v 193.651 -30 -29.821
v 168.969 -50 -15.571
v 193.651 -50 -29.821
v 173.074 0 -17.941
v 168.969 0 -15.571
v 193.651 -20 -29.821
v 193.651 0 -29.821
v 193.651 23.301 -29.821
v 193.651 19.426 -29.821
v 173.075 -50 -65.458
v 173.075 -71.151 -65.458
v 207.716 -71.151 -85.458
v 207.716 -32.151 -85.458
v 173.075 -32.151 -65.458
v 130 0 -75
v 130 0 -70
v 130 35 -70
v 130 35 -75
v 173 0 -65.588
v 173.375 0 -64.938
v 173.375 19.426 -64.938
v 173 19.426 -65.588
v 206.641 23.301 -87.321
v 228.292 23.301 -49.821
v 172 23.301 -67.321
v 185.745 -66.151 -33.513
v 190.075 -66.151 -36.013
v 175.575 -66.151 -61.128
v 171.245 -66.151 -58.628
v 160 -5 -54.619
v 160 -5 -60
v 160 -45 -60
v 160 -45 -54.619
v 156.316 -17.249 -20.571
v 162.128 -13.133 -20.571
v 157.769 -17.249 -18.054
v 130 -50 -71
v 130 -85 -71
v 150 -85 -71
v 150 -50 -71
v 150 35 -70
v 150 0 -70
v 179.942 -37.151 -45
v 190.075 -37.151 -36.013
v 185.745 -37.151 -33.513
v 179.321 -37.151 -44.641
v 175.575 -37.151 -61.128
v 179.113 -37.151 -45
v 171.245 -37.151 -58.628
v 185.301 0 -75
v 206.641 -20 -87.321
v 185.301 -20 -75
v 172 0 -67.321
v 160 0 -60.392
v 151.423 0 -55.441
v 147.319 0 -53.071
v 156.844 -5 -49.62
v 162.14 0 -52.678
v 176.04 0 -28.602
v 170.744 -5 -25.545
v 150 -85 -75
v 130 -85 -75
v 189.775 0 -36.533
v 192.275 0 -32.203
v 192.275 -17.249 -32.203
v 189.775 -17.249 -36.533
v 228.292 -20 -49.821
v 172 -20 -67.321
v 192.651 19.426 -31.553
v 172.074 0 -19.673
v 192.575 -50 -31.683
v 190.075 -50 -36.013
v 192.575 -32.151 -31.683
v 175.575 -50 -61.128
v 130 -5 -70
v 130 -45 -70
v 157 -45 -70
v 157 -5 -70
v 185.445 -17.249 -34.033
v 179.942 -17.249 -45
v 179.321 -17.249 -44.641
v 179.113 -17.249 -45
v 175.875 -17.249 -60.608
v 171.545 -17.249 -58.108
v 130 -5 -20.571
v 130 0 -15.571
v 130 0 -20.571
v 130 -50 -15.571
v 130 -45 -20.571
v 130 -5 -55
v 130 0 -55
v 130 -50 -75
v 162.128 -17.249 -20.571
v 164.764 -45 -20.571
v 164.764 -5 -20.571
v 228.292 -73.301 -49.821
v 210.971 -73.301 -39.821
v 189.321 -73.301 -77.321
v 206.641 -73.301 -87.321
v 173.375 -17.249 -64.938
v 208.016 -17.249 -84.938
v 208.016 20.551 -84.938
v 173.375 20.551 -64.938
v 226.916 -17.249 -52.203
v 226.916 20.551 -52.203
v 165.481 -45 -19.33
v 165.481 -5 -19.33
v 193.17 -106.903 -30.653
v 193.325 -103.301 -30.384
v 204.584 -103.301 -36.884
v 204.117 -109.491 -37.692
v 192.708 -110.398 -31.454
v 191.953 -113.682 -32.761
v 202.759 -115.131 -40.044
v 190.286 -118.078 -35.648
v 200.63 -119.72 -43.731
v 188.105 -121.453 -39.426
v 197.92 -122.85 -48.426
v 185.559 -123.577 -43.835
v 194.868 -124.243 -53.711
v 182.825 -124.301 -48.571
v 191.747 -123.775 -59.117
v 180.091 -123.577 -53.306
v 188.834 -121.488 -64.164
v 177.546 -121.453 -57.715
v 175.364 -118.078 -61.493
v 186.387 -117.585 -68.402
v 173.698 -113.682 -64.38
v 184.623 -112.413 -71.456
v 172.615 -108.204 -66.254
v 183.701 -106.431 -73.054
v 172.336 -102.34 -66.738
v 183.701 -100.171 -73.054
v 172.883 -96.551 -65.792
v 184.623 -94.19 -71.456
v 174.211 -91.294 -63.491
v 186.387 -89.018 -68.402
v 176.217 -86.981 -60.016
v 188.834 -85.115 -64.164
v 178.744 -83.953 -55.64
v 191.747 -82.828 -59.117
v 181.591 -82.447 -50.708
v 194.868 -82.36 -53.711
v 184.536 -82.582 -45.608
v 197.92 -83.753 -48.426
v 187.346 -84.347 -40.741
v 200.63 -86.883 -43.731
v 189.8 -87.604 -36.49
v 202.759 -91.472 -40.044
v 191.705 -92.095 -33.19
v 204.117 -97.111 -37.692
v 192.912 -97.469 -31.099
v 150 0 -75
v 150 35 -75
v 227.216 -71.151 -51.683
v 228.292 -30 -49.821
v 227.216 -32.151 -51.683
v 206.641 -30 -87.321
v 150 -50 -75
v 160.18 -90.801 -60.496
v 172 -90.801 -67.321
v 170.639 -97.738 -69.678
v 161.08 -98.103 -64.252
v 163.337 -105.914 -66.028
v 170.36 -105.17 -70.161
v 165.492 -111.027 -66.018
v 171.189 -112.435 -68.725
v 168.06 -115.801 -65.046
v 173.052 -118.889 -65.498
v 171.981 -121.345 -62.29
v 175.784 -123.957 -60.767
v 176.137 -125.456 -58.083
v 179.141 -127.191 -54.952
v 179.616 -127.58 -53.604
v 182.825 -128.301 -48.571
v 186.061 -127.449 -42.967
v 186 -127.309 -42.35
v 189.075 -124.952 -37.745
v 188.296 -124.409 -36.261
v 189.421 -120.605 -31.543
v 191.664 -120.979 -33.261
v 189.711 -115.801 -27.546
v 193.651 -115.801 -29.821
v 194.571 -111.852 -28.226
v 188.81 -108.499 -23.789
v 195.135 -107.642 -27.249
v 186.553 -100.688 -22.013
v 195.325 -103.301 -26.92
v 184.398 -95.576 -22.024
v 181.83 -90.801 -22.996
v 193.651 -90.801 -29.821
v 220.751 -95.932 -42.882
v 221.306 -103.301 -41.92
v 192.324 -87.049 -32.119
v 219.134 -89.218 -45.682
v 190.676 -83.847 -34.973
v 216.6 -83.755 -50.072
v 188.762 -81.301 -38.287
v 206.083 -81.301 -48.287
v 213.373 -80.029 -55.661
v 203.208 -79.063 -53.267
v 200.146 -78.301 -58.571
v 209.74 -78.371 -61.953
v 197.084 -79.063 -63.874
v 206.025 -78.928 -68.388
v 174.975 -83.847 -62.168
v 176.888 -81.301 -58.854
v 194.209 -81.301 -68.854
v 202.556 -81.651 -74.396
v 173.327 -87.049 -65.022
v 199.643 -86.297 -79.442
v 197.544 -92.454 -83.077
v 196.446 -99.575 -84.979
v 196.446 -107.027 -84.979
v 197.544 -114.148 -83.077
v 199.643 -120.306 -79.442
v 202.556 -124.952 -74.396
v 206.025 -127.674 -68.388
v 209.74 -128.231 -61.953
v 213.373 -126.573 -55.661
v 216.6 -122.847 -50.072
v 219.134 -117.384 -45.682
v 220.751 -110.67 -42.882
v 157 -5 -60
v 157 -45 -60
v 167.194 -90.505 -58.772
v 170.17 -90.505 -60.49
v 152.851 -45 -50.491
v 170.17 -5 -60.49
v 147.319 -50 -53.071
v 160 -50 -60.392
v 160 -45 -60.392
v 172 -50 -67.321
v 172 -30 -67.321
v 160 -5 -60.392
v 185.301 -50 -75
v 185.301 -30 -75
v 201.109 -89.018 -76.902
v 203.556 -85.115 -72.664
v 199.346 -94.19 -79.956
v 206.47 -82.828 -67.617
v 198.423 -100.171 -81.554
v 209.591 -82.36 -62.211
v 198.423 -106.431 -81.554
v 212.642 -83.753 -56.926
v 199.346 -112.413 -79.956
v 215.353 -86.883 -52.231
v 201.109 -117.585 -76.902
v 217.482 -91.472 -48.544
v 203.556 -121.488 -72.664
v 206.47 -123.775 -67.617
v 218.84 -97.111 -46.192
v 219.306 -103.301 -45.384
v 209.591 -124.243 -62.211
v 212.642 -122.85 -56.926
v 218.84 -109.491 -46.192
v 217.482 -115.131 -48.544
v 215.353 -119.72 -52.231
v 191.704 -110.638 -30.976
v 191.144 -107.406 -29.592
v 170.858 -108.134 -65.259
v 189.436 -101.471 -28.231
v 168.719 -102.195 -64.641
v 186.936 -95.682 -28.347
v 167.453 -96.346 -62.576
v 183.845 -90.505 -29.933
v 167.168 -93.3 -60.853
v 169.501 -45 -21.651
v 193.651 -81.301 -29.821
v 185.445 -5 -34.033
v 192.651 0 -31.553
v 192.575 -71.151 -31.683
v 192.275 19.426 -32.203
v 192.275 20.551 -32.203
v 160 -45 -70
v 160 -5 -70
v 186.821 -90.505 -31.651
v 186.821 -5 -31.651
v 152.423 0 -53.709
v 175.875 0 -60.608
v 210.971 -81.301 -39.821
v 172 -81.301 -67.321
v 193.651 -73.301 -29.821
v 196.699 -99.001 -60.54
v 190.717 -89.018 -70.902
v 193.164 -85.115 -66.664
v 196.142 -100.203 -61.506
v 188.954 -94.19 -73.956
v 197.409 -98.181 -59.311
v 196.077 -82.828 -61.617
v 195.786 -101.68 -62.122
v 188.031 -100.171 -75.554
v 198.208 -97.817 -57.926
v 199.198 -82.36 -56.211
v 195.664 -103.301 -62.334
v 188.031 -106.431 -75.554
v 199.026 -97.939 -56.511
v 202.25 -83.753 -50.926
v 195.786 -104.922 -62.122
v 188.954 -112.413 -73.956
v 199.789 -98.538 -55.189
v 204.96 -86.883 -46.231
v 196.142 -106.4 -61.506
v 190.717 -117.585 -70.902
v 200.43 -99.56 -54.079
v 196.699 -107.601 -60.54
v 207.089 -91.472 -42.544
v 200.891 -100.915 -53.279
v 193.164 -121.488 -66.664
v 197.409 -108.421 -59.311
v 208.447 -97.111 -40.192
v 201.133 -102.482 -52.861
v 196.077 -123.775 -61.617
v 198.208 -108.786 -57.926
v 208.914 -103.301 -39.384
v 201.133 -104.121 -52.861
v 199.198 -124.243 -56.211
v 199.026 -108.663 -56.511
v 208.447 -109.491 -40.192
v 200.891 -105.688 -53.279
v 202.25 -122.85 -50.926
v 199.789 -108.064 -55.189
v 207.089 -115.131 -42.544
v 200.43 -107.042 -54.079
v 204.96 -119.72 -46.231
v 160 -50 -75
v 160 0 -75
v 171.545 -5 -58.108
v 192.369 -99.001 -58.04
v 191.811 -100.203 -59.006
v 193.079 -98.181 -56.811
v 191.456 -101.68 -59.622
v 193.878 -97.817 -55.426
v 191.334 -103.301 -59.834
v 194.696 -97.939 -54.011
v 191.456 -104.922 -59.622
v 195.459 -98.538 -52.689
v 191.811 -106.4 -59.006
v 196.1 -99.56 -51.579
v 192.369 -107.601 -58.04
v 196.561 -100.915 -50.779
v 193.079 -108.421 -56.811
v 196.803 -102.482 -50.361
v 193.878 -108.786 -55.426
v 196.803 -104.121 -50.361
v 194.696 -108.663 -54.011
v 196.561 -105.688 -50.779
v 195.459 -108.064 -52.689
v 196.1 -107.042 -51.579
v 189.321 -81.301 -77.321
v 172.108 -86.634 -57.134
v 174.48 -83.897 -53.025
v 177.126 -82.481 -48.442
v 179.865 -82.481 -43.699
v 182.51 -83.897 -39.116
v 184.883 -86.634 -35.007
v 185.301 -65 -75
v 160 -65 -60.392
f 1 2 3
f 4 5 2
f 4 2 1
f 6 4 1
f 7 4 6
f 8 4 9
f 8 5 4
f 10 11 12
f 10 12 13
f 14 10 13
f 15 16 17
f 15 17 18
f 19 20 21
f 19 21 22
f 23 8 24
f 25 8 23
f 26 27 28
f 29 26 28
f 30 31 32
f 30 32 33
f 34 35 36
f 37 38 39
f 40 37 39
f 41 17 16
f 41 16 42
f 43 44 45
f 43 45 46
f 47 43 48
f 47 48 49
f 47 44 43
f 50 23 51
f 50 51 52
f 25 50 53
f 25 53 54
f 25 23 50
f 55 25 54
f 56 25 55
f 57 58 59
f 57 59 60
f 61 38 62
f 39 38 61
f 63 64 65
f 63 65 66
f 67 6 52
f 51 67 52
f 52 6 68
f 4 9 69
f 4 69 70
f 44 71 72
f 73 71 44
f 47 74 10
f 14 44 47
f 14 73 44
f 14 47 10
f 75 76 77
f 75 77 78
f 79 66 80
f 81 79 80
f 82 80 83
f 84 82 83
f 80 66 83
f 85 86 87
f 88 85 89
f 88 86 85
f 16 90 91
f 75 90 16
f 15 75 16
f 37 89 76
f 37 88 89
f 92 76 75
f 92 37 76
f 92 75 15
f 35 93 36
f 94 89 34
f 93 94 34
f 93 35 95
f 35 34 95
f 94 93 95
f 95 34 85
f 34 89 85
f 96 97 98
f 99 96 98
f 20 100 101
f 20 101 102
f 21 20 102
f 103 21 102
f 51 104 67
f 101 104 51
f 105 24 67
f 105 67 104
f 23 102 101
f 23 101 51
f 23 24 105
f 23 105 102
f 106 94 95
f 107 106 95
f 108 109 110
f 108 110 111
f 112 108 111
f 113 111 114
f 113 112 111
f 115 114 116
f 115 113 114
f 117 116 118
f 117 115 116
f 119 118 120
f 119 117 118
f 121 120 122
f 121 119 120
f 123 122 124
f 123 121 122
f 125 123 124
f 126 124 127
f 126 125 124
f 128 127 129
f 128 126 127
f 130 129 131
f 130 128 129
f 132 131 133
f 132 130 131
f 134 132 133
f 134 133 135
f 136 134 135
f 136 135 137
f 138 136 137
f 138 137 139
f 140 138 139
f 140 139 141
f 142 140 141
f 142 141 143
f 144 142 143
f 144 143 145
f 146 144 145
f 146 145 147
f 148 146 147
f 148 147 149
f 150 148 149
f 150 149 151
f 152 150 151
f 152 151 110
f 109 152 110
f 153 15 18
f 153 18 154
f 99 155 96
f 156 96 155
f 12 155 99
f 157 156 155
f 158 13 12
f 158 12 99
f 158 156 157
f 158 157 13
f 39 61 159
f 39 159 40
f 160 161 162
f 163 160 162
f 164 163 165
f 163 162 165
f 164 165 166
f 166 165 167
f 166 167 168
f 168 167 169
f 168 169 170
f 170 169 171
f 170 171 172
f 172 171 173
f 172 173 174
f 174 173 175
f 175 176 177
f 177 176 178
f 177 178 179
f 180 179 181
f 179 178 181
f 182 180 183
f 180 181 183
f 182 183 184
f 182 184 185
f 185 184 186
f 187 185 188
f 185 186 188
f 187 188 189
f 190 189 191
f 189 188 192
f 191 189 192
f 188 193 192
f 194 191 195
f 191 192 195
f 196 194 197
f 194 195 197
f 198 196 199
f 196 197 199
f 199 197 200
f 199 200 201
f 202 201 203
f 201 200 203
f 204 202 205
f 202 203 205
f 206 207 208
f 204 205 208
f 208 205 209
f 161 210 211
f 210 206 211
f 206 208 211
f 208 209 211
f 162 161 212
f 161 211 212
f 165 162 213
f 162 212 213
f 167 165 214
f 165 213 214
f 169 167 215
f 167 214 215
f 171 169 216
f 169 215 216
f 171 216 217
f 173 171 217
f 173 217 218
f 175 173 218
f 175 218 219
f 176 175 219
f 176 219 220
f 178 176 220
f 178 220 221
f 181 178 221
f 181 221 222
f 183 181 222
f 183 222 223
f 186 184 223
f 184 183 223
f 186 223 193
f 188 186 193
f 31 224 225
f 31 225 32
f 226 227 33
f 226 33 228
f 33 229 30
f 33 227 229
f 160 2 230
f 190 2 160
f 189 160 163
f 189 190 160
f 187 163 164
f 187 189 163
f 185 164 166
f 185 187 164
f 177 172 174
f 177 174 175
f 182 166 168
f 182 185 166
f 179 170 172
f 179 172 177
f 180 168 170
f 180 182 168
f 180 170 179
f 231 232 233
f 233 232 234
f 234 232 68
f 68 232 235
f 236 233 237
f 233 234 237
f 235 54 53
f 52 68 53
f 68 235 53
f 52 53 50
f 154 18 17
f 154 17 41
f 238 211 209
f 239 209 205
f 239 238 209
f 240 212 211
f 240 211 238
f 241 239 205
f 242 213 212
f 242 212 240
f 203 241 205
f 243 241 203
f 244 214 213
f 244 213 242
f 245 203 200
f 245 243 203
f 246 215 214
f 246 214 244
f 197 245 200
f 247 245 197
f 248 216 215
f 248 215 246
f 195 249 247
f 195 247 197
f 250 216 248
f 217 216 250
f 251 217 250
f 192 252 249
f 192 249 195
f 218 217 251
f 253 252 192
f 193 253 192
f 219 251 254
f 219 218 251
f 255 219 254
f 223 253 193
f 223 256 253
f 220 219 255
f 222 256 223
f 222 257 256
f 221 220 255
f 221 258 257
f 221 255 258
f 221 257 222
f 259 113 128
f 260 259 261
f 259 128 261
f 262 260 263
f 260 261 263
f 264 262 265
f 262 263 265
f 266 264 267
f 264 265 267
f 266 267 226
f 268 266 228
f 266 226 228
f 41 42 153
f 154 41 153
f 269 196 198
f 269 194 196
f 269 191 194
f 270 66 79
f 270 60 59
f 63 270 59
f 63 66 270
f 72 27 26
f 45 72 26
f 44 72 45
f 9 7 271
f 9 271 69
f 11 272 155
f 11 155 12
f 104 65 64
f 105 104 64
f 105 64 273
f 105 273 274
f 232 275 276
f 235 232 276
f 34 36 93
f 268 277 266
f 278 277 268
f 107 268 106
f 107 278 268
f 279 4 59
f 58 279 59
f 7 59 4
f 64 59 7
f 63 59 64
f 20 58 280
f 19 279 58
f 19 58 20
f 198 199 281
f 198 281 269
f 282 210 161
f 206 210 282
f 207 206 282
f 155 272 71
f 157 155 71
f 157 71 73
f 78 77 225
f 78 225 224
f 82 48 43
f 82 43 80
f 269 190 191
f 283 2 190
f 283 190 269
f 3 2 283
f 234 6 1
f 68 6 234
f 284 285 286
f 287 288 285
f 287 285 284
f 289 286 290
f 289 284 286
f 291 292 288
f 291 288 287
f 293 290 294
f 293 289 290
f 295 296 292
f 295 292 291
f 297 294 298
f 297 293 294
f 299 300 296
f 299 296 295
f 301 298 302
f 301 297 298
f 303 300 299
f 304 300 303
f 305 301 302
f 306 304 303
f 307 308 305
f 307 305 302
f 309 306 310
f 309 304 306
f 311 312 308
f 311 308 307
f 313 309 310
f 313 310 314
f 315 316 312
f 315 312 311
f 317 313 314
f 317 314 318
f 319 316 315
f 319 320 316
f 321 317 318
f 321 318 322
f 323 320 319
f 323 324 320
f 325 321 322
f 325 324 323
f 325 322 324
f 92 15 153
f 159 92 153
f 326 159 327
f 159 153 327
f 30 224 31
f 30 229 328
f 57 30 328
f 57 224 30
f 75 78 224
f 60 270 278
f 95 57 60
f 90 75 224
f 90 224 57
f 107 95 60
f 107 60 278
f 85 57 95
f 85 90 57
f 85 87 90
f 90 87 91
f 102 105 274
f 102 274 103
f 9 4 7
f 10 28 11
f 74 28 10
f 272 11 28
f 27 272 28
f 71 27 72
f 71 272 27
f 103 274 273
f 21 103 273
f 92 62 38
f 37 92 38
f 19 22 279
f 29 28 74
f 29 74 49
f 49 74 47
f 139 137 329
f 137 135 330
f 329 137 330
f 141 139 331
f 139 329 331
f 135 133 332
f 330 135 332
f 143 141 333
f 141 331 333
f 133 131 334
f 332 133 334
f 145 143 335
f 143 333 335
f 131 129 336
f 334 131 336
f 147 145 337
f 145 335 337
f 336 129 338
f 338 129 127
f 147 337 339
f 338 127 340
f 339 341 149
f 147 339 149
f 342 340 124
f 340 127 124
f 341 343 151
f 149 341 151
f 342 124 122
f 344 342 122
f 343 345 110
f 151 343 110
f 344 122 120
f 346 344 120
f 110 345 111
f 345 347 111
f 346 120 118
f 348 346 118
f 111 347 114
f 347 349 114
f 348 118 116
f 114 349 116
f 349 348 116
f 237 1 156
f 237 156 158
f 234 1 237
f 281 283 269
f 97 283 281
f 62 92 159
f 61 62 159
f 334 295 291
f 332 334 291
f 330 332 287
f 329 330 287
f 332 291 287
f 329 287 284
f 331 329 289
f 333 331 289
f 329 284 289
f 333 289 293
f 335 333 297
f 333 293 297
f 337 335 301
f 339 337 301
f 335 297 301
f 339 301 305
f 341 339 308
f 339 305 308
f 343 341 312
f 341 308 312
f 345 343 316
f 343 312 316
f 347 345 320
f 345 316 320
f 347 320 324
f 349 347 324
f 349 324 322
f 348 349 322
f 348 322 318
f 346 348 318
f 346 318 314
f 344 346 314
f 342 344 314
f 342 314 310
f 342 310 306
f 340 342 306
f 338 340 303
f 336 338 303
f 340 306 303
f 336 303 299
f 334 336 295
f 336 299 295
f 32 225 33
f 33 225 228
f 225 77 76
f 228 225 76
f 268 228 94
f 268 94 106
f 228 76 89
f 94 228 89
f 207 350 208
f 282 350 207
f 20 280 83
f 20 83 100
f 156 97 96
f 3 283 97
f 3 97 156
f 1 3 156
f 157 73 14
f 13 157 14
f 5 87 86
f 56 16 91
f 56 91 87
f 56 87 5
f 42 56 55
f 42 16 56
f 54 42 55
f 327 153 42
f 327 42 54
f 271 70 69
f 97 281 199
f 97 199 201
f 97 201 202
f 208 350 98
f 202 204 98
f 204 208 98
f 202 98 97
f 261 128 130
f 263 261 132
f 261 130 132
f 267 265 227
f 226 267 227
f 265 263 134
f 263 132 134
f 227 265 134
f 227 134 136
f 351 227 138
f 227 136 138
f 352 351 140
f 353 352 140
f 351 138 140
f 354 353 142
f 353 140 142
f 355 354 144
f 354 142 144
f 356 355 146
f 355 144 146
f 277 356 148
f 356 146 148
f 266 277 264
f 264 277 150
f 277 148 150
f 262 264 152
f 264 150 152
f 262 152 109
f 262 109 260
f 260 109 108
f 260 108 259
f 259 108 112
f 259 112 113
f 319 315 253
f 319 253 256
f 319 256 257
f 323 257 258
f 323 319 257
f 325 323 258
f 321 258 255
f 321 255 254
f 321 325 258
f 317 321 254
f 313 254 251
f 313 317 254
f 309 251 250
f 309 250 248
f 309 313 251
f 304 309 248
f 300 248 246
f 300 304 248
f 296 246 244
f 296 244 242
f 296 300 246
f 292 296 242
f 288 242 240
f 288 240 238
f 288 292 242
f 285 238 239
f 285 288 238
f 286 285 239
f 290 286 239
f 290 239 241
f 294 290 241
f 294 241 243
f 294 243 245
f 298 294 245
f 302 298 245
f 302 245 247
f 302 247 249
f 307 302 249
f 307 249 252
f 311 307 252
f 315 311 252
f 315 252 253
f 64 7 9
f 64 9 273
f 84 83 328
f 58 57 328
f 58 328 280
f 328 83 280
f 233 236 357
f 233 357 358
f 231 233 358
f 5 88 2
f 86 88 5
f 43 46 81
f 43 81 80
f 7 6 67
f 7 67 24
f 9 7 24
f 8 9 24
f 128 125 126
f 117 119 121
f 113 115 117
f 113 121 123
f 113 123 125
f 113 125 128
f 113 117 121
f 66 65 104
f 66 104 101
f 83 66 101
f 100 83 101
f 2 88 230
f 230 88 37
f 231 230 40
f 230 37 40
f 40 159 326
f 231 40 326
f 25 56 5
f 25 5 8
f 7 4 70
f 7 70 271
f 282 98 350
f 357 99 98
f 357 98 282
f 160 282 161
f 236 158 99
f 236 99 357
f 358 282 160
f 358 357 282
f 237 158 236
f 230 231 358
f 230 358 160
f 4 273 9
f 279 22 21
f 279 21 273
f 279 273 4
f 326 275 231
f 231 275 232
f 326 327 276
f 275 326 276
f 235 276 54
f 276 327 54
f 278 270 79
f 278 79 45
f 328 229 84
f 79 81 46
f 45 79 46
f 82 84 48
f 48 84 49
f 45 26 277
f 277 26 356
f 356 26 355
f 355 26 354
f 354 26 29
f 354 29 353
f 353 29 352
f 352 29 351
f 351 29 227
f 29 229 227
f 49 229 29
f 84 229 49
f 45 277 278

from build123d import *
from build123d.topology import SkipClean

# Parameters (mm, degrees)
SKETCH_1_W                         = 142
SKETCH_1_H                         = 50
EXTRUDE_1_DEPTH                    = 50
EXTRUDE_2_DEPTH                    = 50
SKETCH_3_W                         = 43.301270189
SKETCH_3_H                         = 43.301270189
SKETCH_3_W_2                       = 39
SKETCH_3_H_2                       = 39
EXTRUDE_1229_DEPTH                 = 40
SKETCH_4_W                         = 43.301270189
SKETCH_4_H                         = 43.301270189
SKETCH_4_W_2                       = 37.8
SKETCH_4_H_2                       = 37.8
EXTRUDE_1555_DEPTH                 = 40
SKETCH_6_R                         = 25
SKETCH_6_R_2                       = 21
EXTRUDE_5_DEPTH                    = 30
EXTRUDE_START                      = -12
SKETCH_8_R                         = 21
SKETCH_8_R_2                       = 5.5
EXTRUDE_6_DEPTH                    = 5
EXTRUDE_START_2                    = -43.30127
EXTRUDE_7_DEPTH                    = 43.30127
EXTRUDE_10_REACH                   = 275.562
SKETCH_10_W                        = 20
SKETCH_10_H                        = 8
EXTRUDE_11_REACH                   = 275.562
EXTRUDE_12_DEPTH                   = 2
EXTRUDE_13_DEPTH                   = 2
CUT_EXTRUDE_1_DEPTH                = 249.328501215
EXTRUDE_14_REACH                   = 225.182
CUT_EXTRUDE_2_REACH                = 278.049
SKETCH_17_W                        = 40
SKETCH_17_H                        = 40
CUT_EXTRUDE_START                  = -5
CUT_EXTRUDE_3_DEPTH                = 33.301270189
CUT_EXTRUDE_4_REACH                = 230.182
CUT_EXTRUDE_4_OFFSET_FROM_SURFACE  = 5
SKETCH_20_W                        = 27.8
SKETCH_20_H                        = 30
CUT_EXTRUDE_5_REACH                = 230.182
CUT_EXTRUDE_5_OFFSET_FROM_SURFACE  = 5
SKETCH_22_W                        = 29
SKETCH_22_H                        = 29
CUT_EXTRUDE_START_2                = -19.776530706
CUT_EXTRUDE_6_OUTLINE_R            = 5.5
CUT_EXTRUDE_6_DEPTH                = 1.776530706
CUT_EXTRUDE_START_3                = 177.616623489
CUT_EXTRUDE_6_2_OUTLINE_R          = 5.5
CUT_EXTRUDE_6_2_DEPTH              = 3.223469294
CUT_EXTRUDE_START_4                = 129
CUT_EXTRUDE_6_3_OUTLINE_W          = 14
CUT_EXTRUDE_6_3_OUTLINE_H          = 14
CUT_EXTRUDE_6_3_DEPTH              = 3.721874706
CUT_EXTRUDE_7_REACH                = 225.182
SKETCH_24_R                        = 21
EXTRUDE_START_3                    = -50
SKETCH_28_W                        = 40
SKETCH_28_H                        = 60
EXTRUDE_15_DEPTH                   = 25
SKETCH_28_H_2                      = 35
EXTRUDE_15_2_DEPTH                 = 25
EXTRUDE_16_REACH                   = 278.049
SKETCH_29_W                        = 25
SKETCH_29_H                        = 50
SKETCH_30_W                        = 25
SKETCH_30_H                        = 40
CUT_EXTRUDE_8_DEPTH                = 160
SKETCH_31_W                        = 15.570842249
SKETCH_31_H                        = 50
CUT_EXTRUDE_9_DEPTH                = 277.049207735
EXTRUDE_17_REACH                   = 278.049
SKETCH_32_W                        = 5
SKETCH_32_H                        = 40
SKETCH_33_W                        = 40
SKETCH_33_H                        = 30
CUT_EXTRUDE_10_DEPTH               = 5
SKETCH_34_W                        = 40
SKETCH_34_H                        = 34.429157751
CUT_EXTRUDE_12_DEPTH               = 5
CUT_EXTRUDE_15_REACH               = 280.632
CUT_EXTRUDE_15_OFFSET_FROM_SURFACE = 5
SKETCH_37_W                        = 15.381197846
SKETCH_37_H                        = 25
EXTRUDE_18_DEPTH                   = 20
CHAMFER_1_SIZE                     = 1
CUT_EXTRUDE_16_DEPTH               = 277.049207735
CUT_EXTRUDE_16_DEPTH_BACK          = 277.049207735
SKETCH_38_W                        = 168.693453403
SKETCH_38_H                        = 59.429157751
SKETCH_39_W                        = 20
SKETCH_39_H                        = 5
EXTRUDE_19_DEPTH                   = 35
SKETCH_40_W                        = 20
SKETCH_40_H                        = 4
EXTRUDE_20_DEPTH                   = 35
CUT_EXTRUDE_17_DEPTH               = 65
SKETCH_42_W                        = 3
SKETCH_42_H                        = 40
EXTRUDE_21_DEPTH                   = 10


with BuildPart() as part:
    # 草图1 → 凸台-拉伸1 (new body)
    with BuildSketch(Plane.XY):
        with Locations((71, -25)):
            Rectangle(SKETCH_1_W, SKETCH_1_H)
    extrude(amount=-EXTRUDE_1_DEPTH)

    # 草图2 → 凸台-拉伸2 (add)
    with BuildSketch(Plane(origin=(0, 0, 0), x_dir=(1, 0, 0), z_dir=(0, 1, 0))):
        Polygon((172, 67.320508076), (142, 50), (142, 0), (193.650635095, 29.820508076), align=None)
    extrude(amount=-EXTRUDE_2_DEPTH)

    # 草图3 → Extrude 1229 (add)
    with BuildSketch(Plane(origin=(158.150635095, 0, -91.308311744), x_dir=(-0.5000000000000012, 0, -0.866025403784438), z_dir=(0.8660254037844379, 0, -0.5000000000000011))):
        with Locations((-49.349364906, -51.650635095)):
            Rectangle(SKETCH_3_W, SKETCH_3_H)
        with Locations((-49.349364905, -51.650635095)):
            Rectangle(SKETCH_3_W_2, SKETCH_3_H_2, mode=Mode.SUBTRACT)
    extrude(amount=EXTRUDE_1229_DEPTH)

    # 草图4 → Extrude 1555 (add)
    with BuildSketch(Plane(origin=(158.150635095, 0, -91.308311744), x_dir=(-0.5000000000000012, 0, -0.866025403784438), z_dir=(0.8660254037844379, 0, -0.5000000000000011))):
        with Locations((-49.349364906, 1.650635095)):
            Rectangle(SKETCH_4_W, SKETCH_4_H)
        with Locations((-49.349364905, 1.650635095)):
            Rectangle(SKETCH_4_W_2, SKETCH_4_H_2, mode=Mode.SUBTRACT)
    extrude(amount=EXTRUDE_1555_DEPTH)



with BuildPart() as body_2:
    # 草图6 → 凸台-拉伸5 (new body)
    with BuildSketch(Plane(origin=(158.150635095, 0, -91.308311744), x_dir=(-0.5000000000000012, 0, -0.866025403784438), z_dir=(0.8660254037844379, 0, -0.5000000000000011))):
        with Locations(Location((-49.349364905, -103.301270189, 0), (0, 0, 180))):
            Circle(SKETCH_6_R)
        with Locations(Location((-49.349364905, -103.301270189, 0), (0, 0, 180))):
            Circle(SKETCH_6_R_2, mode=Mode.SUBTRACT)
    extrude(amount=EXTRUDE_5_DEPTH)

    # 草图8 → 凸台-拉伸6 (add)
    with BuildSketch(Plane(origin=(184.131397208, 0, -106.308311744), x_dir=(-0.5000000000000014, 0, -0.8660254037844379), z_dir=(0.8660254037844378, 0, -0.5000000000000013)).offset(EXTRUDE_START)):
        with Locations(Location((-49.349364905, -103.301270189, 0), (0, 0, 180))):
            Circle(SKETCH_8_R)
        with Locations((-49.349364905, -103.301270189)):
            Circle(SKETCH_8_R_2, mode=Mode.SUBTRACT)
    extrude(amount=-EXTRUDE_6_DEPTH)


with BuildPart() as part_1:
    with SkipClean():  # the faces are left unmerged after this step: merging them gives an invalid solid
        add(part.part)

        add(body_2.part)  # 凸台-拉伸7 merges body 2
        # 草图9 → 凸台-拉伸7 (add)
        with BuildSketch(Plane(origin=(13.849364905, 0, 23.987803669), x_dir=(-0.866025403784438, 0, 0.5000000000000012), z_dir=(-0.5000000000000012, 0, -0.866025403784438)).offset(EXTRUDE_START_2)):
            Polygon((-154.117291835, -50), (-182.616623489, -128.301270189), (-182.616623489, -50), align=None)
        extrude(amount=EXTRUDE_7_DEPTH)

    # 凸台-拉伸10: up to this face of the body (flat: up to its plane)
    extrude_10_end = Plane(part_1.part.faces().sort_by_distance((191.011477977, -25, -28.296790003))[0])
    # 草图10 → 凸台-拉伸10 (add, up to the picked face)
    with BuildSketch(Plane(origin=(13.849364905, 0, 23.987803669), x_dir=(-0.866025403784438, 0, 0.5000000000000012), z_dir=(-0.5000000000000012, 0, -0.866025403784438)), mode=Mode.PRIVATE) as extrude_10_sk1:
        with Locations((-192.616623489, -77.301270189)):
            Rectangle(SKETCH_10_W, SKETCH_10_H)
    extrude_10_tool1 = split(extrude(extrude_10_sk1.sketch, amount=-EXTRUDE_10_REACH, mode=Mode.PRIVATE), bisect_by=extrude_10_end, keep=Keep.BOTH, mode=Mode.PRIVATE)
    add(extrude_10_tool1.solids().sort_by(Axis((180.660254, -77.30127, -72.320508), (0.5000000000000012, 0, 0.866025403784438)))[0])

    # 凸台-拉伸11: up to this face of the body (flat: up to its plane)
    extrude_11_end = Plane(part_1.part.faces().sort_by_distance((191.011477977, -25, -28.296790003))[0])
    # 草图11 → 凸台-拉伸11 (add, up to the picked face)
    with BuildSketch(Plane(origin=(13.849364905, 0, 23.987803669), x_dir=(-0.866025403784438, 0, 0.5000000000000012), z_dir=(-0.5000000000000012, 0, -0.866025403784438)), mode=Mode.PRIVATE) as extrude_11_sk1:
        Polygon((-154.117291835, 0), (-182.616623489, 23.301270189), (-182.616623489, 19.42617797), (-158.856841973, 0), align=None)
    extrude_11_tool1 = split(extrude(extrude_11_sk1.sketch, amount=-EXTRUDE_11_REACH, mode=Mode.PRIVATE), bisect_by=extrude_11_end, keep=Keep.BOTH, mode=Mode.PRIVATE)
    add(extrude_11_tool1.solids().sort_by(Axis((160.654549, 10.711149, -60.770209), (0.5000000000000012, 0, 0.866025403784438)))[0])

    # 草图12 → 凸台-拉伸12 (add)
    with SkipClean():  # the faces are left unmerged after this step: merging them gives an invalid solid
        with BuildSketch(Plane(origin=(13.849364905, 0, 23.987803669), x_dir=(-0.866025403784438, 0, 0.5000000000000012), z_dir=(-0.5000000000000012, 0, -0.866025403784438))):
            Polygon((-182.616623489, 19.42617797), (-182.616623489, 0), (-158.856841973, 0), align=None)
        extrude(amount=-EXTRUDE_12_DEPTH)

    # 草图15 → 切除-拉伸1 (cut, through all)
    with SkipClean():  # the faces are left unmerged after this step: merging them gives an invalid solid
        with BuildSketch(Plane(origin=(184.131397208, 0, -106.308311744), x_dir=(-0.5000000000000014, 0, -0.8660254037844379), z_dir=(0.8660254037844378, 0, -0.5000000000000013))):
            with BuildLine():
                Line((-49.349364905, -128.301270189), (-27.698729811, -128.301270189))
                Line((-27.698729811, -128.301270189), (-27.698729811, -115.801270189))
                ThreePointArc((-27.698729811, -115.801270189), (-36.849364905, -124.951905284), (-49.349364905, -128.301270189))
            make_face()
            with BuildLine():
                Line((-71, -128.301270189), (-49.349364905, -128.301270189))
                ThreePointArc((-49.349364905, -128.301270189), (-61.849364905, -124.951905284), (-71, -115.801270189))
                Line((-71, -115.801270189), (-71, -128.301270189))
            make_face()
        extrude(amount=-CUT_EXTRUDE_1_DEPTH, mode=Mode.SUBTRACT)

    # 凸台-拉伸14: up to this plane
    with SkipClean():  # the faces are left unmerged after this step: merging them gives an invalid solid
        extrude_14_end = Plane(origin=(210.632725537, -50, 56.591998698), z_dir=(-0.8137976813493748, -0.3420201433256631, 0.46984631039295627))
        # 草图16 → 凸台-拉伸14 (add, up to the surface)
        with BuildSketch(Plane(origin=(158.150635095, 0, -91.308311744), x_dir=(0.5000000000000014, 0, 0.8660254037844379), z_dir=(-0.8660254037844378, 0, 0.5000000000000013)), mode=Mode.PRIVATE) as extrude_14_sk1:
            with BuildLine():
                Line((27.698729811, -115.801270189), (27.698729811, -90.801270189))
                ThreePointArc((27.698729811, -90.801270189), (24.349364905, -103.301270189), (27.698729811, -115.801270189))
            make_face()
        extrude_14_tool1 = split(extrude(extrude_14_sk1.sketch, amount=EXTRUDE_14_REACH, mode=Mode.PRIVATE), bisect_by=extrude_14_end, keep=Keep.BOTH, mode=Mode.PRIVATE)
        add(extrude_14_tool1.solids().sort_by_distance((171.326125, -103.30127, -68.487693))[0])
        # 草图16 → 凸台-拉伸14 (add, up to the surface)
        with BuildSketch(Plane(origin=(158.150635095, 0, -91.308311744), x_dir=(0.5000000000000014, 0, 0.8660254037844379), z_dir=(-0.8660254037844378, 0, 0.5000000000000013)), mode=Mode.PRIVATE) as extrude_14_sk2:
            with BuildLine():
                Line((71, -90.801270189), (71, -115.801270189))
                ThreePointArc((71, -115.801270189), (74.349364905, -103.301270189), (71, -90.801270189))
            make_face()
        extrude_14_tool2 = split(extrude(extrude_14_sk2.sketch, amount=EXTRUDE_14_REACH, mode=Mode.PRIVATE), bisect_by=extrude_14_end, keep=Keep.BOTH, mode=Mode.PRIVATE)
        add(extrude_14_tool2.solids().sort_by_distance((194.32451, -103.30127, -28.653323))[0])
    add(part_1.part.scale(1), mode=Mode.REPLACE)  # the faces are merged on a copy

    # 切除-拉伸2: up to this plane
    cut_extrude_2_end = Plane(origin=(25.5, -134.851864524, 44.167295593), z_dir=(0.5000000000000016, 0, 0.8660254037844378))
    # 草图17 → 切除-拉伸2 (cut, up to the surface)
    with BuildSketch(Plane.ZY, mode=Mode.PRIVATE) as cut_extrude_2_sk1:
        with Locations((-25, -25)):
            Rectangle(SKETCH_17_W, SKETCH_17_H)
    cut_extrude_2_tool1 = split(extrude(cut_extrude_2_sk1.sketch, amount=-CUT_EXTRUDE_2_REACH, mode=Mode.PRIVATE), bisect_by=cut_extrude_2_end, keep=Keep.BOTH, mode=Mode.PRIVATE)
    add(cut_extrude_2_tool1.solids().sort_by_distance((0, -25, -25))[0], mode=Mode.SUBTRACT)

    # 草图19 → 切除-拉伸3 (cut)
    with BuildSketch(Plane(origin=(13.849364905, 0, 23.987803669), x_dir=(-0.866025403784438, 0, 0.5000000000000012), z_dir=(-0.5000000000000012, 0, -0.866025403784438)).offset(CUT_EXTRUDE_START)):
        Polygon((-177.616623489, -5), (-177.616623489, -99.944861091), (-157.618329526, -45), (-152.975607337, -45), (-152.975607337, -5), align=None)
    extrude(amount=-CUT_EXTRUDE_3_DEPTH, mode=Mode.SUBTRACT)

    # 切除-拉伸4: up to this face of the body (flat: up to its plane, moved by the offset)
    cut_extrude_4_end = Plane(part_1.part.faces().sort_by_distance((173.037030357, 9.713088985, -41.764537293))[0]).offset(CUT_EXTRUDE_4_OFFSET_FROM_SURFACE)
    # 草图20 → 切除-拉伸4 (cut, up to the picked face)
    with BuildSketch(Plane(origin=(158.150635095, 0, -91.308311744), x_dir=(-0.5000000000000012, 0, -0.866025403784438), z_dir=(0.8660254037844379, 0, -0.5000000000000011)), mode=Mode.PRIVATE) as cut_extrude_4_sk1:
        with Locations((-49.349364905, -2.249364905)):
            Rectangle(SKETCH_20_W, SKETCH_20_H)
    cut_extrude_4_tool1 = split(extrude(cut_extrude_4_sk1.sketch, amount=-CUT_EXTRUDE_4_REACH, mode=Mode.PRIVATE), bisect_by=cut_extrude_4_end, keep=Keep.BOTH, mode=Mode.PRIVATE)
    add(cut_extrude_4_tool1.solids().sort_by(Axis((182.825318, -2.249365, -48.570508), (-0.8660254037844379, 0, 0.5000000000000011)))[0], mode=Mode.SUBTRACT)

    # 切除-拉伸5: up to this face of the body (flat: up to its plane, moved by the offset)
    cut_extrude_5_end = Plane(part_1.part.faces().sort_by_distance((169.937789639, -87.415411915, -41.129890369))[0]).offset(-CUT_EXTRUDE_5_OFFSET_FROM_SURFACE)
    # 草图22 → 切除-拉伸5 (cut, up to the picked face)
    with BuildSketch(Plane(origin=(158.150635095, 0, -91.308311744), x_dir=(-0.5000000000000012, 0, -0.866025403784438), z_dir=(0.8660254037844379, 0, -0.5000000000000011)), mode=Mode.PRIVATE) as cut_extrude_5_sk1:
        with Locations((-49.349364905, -51.650635095)):
            Rectangle(SKETCH_22_W, SKETCH_22_H)
    cut_extrude_5_tool1 = split(extrude(cut_extrude_5_sk1.sketch, amount=-CUT_EXTRUDE_5_REACH, mode=Mode.PRIVATE), bisect_by=cut_extrude_5_end, keep=Keep.BOTH, mode=Mode.PRIVATE)
    add(cut_extrude_5_tool1.solids().sort_by(Axis((182.825318, -51.650635, -48.570508), (-0.8660254037844379, 0, 0.5000000000000011)))[0], mode=Mode.SUBTRACT)

    # 切除-拉伸6: read off the stored shape, not the designer's step
    # 切除-拉伸6 outline → 切除-拉伸6 (cut)
    with BuildSketch(Plane(origin=(173.739092363, 0, -100.308311744), x_dir=(-0.5000000000000017, 0, -0.8660254037844378), z_dir=(0.8660254037844377, 0, -0.5000000000000016)).offset(CUT_EXTRUDE_START_2)):
        with Locations((-49.349364905, -103.301270189)):
            Circle(CUT_EXTRUDE_6_OUTLINE_R)
    extrude(amount=CUT_EXTRUDE_6_DEPTH, mode=Mode.SUBTRACT)

    # Cut-Extrude 6 2 outline → Cut-Extrude 6 2 (cut)
    with BuildSketch(Plane(origin=(0, 0, 0), x_dir=(0.5000000000000016, 0, 0.8660254037844377), z_dir=(0.8660254037844377, 0, -0.5000000000000018)).offset(CUT_EXTRUDE_START_3)):
        with Locations((49.349364905, 103.301270189)):
            Circle(CUT_EXTRUDE_6_2_OUTLINE_R)
    extrude(amount=CUT_EXTRUDE_6_2_DEPTH, mode=Mode.SUBTRACT)

    # Cut-Extrude 6 3 outline → Cut-Extrude 6 3 (add)
    with SkipClean():  # the faces are left unmerged after this step: merging them gives an invalid solid
        with BuildSketch(Plane(origin=(0, 0, 0), x_dir=(0.5811482890195767, -0.4789400655085298, 0.6579385076284131), z_dir=(0.8137976813493747, 0.342020143325664, -0.46984631039295593)).offset(CUT_EXTRUDE_START_4)):
            with Locations((123, 111)):
                Rectangle(CUT_EXTRUDE_6_3_OUTLINE_W, CUT_EXTRUDE_6_3_OUTLINE_H)
        extrude(amount=CUT_EXTRUDE_6_3_DEPTH)

    # 切除-拉伸7: up to this face of the body (flat: up to its plane)
    cut_extrude_7_end = Plane(part_1.part.faces().sort_by_distance((172.347083394, -80.42193919, -42.507817086))[0])
    # 草图24 → 切除-拉伸7 (cut, up to the picked face)
    with BuildSketch(Plane(origin=(158.150635095, 0, -91.308311744), x_dir=(-0.5000000000000013, 0, -0.8660254037844379), z_dir=(0.8660254037844378, 0, -0.5000000000000012)), mode=Mode.PRIVATE) as cut_extrude_7_sk1:
        with Locations(Location((-49.349364905, -103.301270189, 0), (0, 0, 209.625730133))):
            Circle(SKETCH_24_R)
    cut_extrude_7_tool1 = split(extrude(cut_extrude_7_sk1.sketch, amount=-CUT_EXTRUDE_7_REACH, mode=Mode.PRIVATE), bisect_by=cut_extrude_7_end, keep=Keep.BOTH, mode=Mode.PRIVATE)
    add(cut_extrude_7_tool1.solids().sort_by(Axis((182.825318, -103.30127, -48.570508), (-0.8660254037844378, 0, 0.5000000000000012)))[0], mode=Mode.SUBTRACT)

    # 凸台-拉伸16: up to this plane
    with SkipClean():  # the faces are left unmerged after this step: merging them gives an invalid solid
        extrude_16_end = Plane(origin=(13.849364905, -134.851864524, 23.987803669), z_dir=(0.5000000000000013, 0, 0.8660254037844379))
        # 草图29 → 凸台-拉伸16 (add, up to the surface)
        with BuildSketch(Plane.ZY, mode=Mode.PRIVATE) as extrude_16_sk1:
            with Locations((-62.5, -25)):
                Rectangle(SKETCH_29_W, SKETCH_29_H)
        extrude_16_tool1 = split(extrude(extrude_16_sk1.sketch, amount=-EXTRUDE_16_REACH, mode=Mode.PRIVATE), bisect_by=extrude_16_end, keep=Keep.BOTH, mode=Mode.PRIVATE)
        add(extrude_16_tool1.solids().sort_by_distance((0, -25, -62.5))[0])

    # 草图30 → 切除-拉伸8 (cut)
    with SkipClean():  # the faces are left unmerged after this step: merging them gives an invalid solid
        with BuildSketch(Plane.ZY):
            with Locations((-57.5, -25)):
                Rectangle(SKETCH_30_W, SKETCH_30_H)
        extrude(amount=-CUT_EXTRUDE_8_DEPTH, mode=Mode.SUBTRACT)

    # 草图31 → 切除-拉伸9 (cut, through all)
    with SkipClean():  # the faces are left unmerged after this step: merging them gives an invalid solid
        with BuildSketch(Plane.ZY):
            with Locations((-7.785421125, -25)):
                Rectangle(SKETCH_31_W, SKETCH_31_H)
        extrude(amount=-CUT_EXTRUDE_9_DEPTH, mode=Mode.SUBTRACT)

    # 凸台-拉伸17: up to this plane
    extrude_17_end = Plane(origin=(25.5, -134.851864524, 44.167295593), z_dir=(0.5000000000000016, 0, 0.8660254037844378))
    # 草图32 → 凸台-拉伸17 (add, up to the surface)
    with BuildSketch(Plane.ZY, mode=Mode.PRIVATE) as extrude_17_sk1:
        with Locations((-18.070842249, -25)):
            Rectangle(SKETCH_32_W, SKETCH_32_H)
    extrude_17_tool1 = split(extrude(extrude_17_sk1.sketch, amount=-EXTRUDE_17_REACH, mode=Mode.PRIVATE), bisect_by=extrude_17_end, keep=Keep.BOTH, mode=Mode.PRIVATE)
    add(extrude_17_tool1.solids().sort_by_distance((0, -25, -18.070842))[0])

    # 草图33 → 切除-拉伸10 (cut)
    with BuildSketch(Plane.XY.offset(-15.570842249)):
        with Locations((20, -25)):
            Rectangle(SKETCH_33_W, SKETCH_33_H)
    extrude(amount=-CUT_EXTRUDE_10_DEPTH, mode=Mode.SUBTRACT)

    # 草图34 → 切除-拉伸12 (cut)
    with BuildSketch(Plane(origin=(0, 0, 0), x_dir=(1, 0, 0), z_dir=(0, 1, 0))):
        with Locations((110, 37.785421125)):
            Rectangle(SKETCH_34_W, SKETCH_34_H)
    extrude(amount=-CUT_EXTRUDE_12_DEPTH, mode=Mode.SUBTRACT)

    # 切除-拉伸15: up to this face of the body (flat: up to its plane, moved by the offset)
    cut_extrude_15_end = Plane(part_1.part.faces().sort_by_distance((77.969126343, -25, -15.570842249))[0]).offset(-CUT_EXTRUDE_15_OFFSET_FROM_SURFACE)
    # 草图35 → 切除-拉伸15 (cut, up to the picked face)
    with BuildSketch(Plane(origin=(25.5, 0, 44.167295593), x_dir=(-0.8660254037844378, 0, 0.5000000000000016), z_dir=(-0.5000000000000016, 0, -0.8660254037844378)), mode=Mode.PRIVATE) as cut_extrude_15_sk1:
        Polygon((-152.975607337, -11.267029174), (-152.975607337, -17.249364905), (-152.975607337, -45), (-129.476275683, -45), (-129.476275683, -5), (-152.975607337, -5), align=None)
    cut_extrude_15_tool1 = split(extrude(cut_extrude_15_sk1.sketch, amount=-CUT_EXTRUDE_15_REACH, mode=Mode.PRIVATE), bisect_by=cut_extrude_15_end, keep=Keep.BOTH, mode=Mode.PRIVATE)
    add(cut_extrude_15_tool1.solids().sort_by(Axis((147.805253, -25, -26.445675), (0.5000000000000016, 0, 0.8660254037844378)))[0], mode=Mode.SUBTRACT)



with BuildPart() as body_2_2:
    # 草图14 → 凸台-拉伸13 (new body)
    with BuildSketch(Plane(origin=(35.5, 0, 61.487803669), x_dir=(0.8660254037844377, 0, -0.5000000000000018), z_dir=(0.5000000000000018, 0, 0.8660254037844377))):
        Polygon((182.616623489, 19.42617797), (158.856841973, 0), (182.616623489, 0), align=None)
    extrude(amount=-EXTRUDE_13_DEPTH)


with BuildPart() as body_3:
    # 草图28 → 凸台-拉伸15 (new body)
    with BuildSketch(Plane.XY.offset(EXTRUDE_START_3)):
        with Locations((20, 30)):
            Rectangle(SKETCH_28_W, SKETCH_28_H)
    extrude(amount=-EXTRUDE_15_DEPTH)


with BuildPart() as body_4:
    # 草图28 → Extrude 15 2 (new body)
    with BuildSketch(Plane.XY.offset(EXTRUDE_START_3)):
        with Locations((20, -67.5)):
            Rectangle(SKETCH_28_W, SKETCH_28_H_2)
    extrude(amount=-EXTRUDE_15_2_DEPTH)


with BuildPart() as part_2:
    with SkipClean():  # the faces are left unmerged after this step: merging them gives an invalid solid
        add(part_1.part)

        add(body_3.part)  # 凸台-拉伸18 merges body 3

        add(body_4.part)  # 凸台-拉伸18 merges body 4
        # 草图37 → 凸台-拉伸18 (add)
        with BuildSketch(Plane.ZY):
            with Locations((-62.309401077, 12.5)):
                Rectangle(SKETCH_37_W, SKETCH_37_H)
            with Locations((-62.309401077, -62.5)):
                Rectangle(SKETCH_37_W, SKETCH_37_H)
        extrude(amount=EXTRUDE_18_DEPTH)

    # 倒角1
    chamfer_1_edges = [part_2.edges().sort_by_distance(p)[0] for p in [
        (-20, -62.5, -70),
        (-20, -75, -62.309401077),
        (-20, -62.5, -54.618802154),
        (-20, -50, -62.309401077),
        (-20, 12.5, -70),
        (-20, 0, -62.309401077),
        (-20, 12.5, -54.618802154),
        (-20, 25, -62.309401077),
    ]]
    chamfer(chamfer_1_edges, length=CHAMFER_1_SIZE)

    # 草图38 → 切除-拉伸16 (cut, two sides: drawn at the far end of the back side and taken through both)
    with SkipClean():  # the faces are left unmerged after this step: merging them gives an invalid solid
        with BuildSketch(Plane(origin=(0, 0, 0), x_dir=(1, 0, 0), z_dir=(0, 1, 0)).offset(-CUT_EXTRUDE_16_DEPTH_BACK)):
            with Locations((45.653273298, 45.285421125)):
                Rectangle(SKETCH_38_W, SKETCH_38_H)
        extrude(amount=CUT_EXTRUDE_16_DEPTH + CUT_EXTRUDE_16_DEPTH_BACK, mode=Mode.SUBTRACT)

    # 草图39 → 凸台-拉伸19 (add)
    with SkipClean():  # the faces are left unmerged after this step: merging them gives an invalid solid
        with BuildSketch(Plane(origin=(0, 0, 0), x_dir=(1, 0, 0), z_dir=(0, 1, 0))):
            with Locations((140, 72.5)):
                Rectangle(SKETCH_39_W, SKETCH_39_H)
        extrude(amount=EXTRUDE_19_DEPTH)

    # 草图40 → 凸台-拉伸20 (add)
    with SkipClean():  # the faces are left unmerged after this step: merging them gives an invalid solid
        with BuildSketch(Plane.XZ.offset(50)):
            with Locations((140, -73)):
                Rectangle(SKETCH_40_W, SKETCH_40_H)
        extrude(amount=EXTRUDE_20_DEPTH)

    # 草图41 → 切除-拉伸17 (cut)
    with SkipClean():  # the faces are left unmerged after this step: merging them gives an invalid solid
        with BuildSketch(Plane(origin=(0, 0, 0), x_dir=(1, 0, 0), z_dir=(0, 1, 0))):
            Polygon((185.301270189, 75), (160, 75), (160, 60.392304845), align=None)
        extrude(amount=-CUT_EXTRUDE_17_DEPTH, mode=Mode.SUBTRACT)

    # 草图42 → 凸台-拉伸21 (add)
    with SkipClean():  # the faces are left unmerged after this step: merging them gives an invalid solid
        with BuildSketch(Plane.XY.offset(-70)):
            with Locations((158.5, -25)):
                Rectangle(SKETCH_42_W, SKETCH_42_H)
        extrude(amount=EXTRUDE_21_DEPTH)


solid = Compound([body_2_2.part, part_2.part])
